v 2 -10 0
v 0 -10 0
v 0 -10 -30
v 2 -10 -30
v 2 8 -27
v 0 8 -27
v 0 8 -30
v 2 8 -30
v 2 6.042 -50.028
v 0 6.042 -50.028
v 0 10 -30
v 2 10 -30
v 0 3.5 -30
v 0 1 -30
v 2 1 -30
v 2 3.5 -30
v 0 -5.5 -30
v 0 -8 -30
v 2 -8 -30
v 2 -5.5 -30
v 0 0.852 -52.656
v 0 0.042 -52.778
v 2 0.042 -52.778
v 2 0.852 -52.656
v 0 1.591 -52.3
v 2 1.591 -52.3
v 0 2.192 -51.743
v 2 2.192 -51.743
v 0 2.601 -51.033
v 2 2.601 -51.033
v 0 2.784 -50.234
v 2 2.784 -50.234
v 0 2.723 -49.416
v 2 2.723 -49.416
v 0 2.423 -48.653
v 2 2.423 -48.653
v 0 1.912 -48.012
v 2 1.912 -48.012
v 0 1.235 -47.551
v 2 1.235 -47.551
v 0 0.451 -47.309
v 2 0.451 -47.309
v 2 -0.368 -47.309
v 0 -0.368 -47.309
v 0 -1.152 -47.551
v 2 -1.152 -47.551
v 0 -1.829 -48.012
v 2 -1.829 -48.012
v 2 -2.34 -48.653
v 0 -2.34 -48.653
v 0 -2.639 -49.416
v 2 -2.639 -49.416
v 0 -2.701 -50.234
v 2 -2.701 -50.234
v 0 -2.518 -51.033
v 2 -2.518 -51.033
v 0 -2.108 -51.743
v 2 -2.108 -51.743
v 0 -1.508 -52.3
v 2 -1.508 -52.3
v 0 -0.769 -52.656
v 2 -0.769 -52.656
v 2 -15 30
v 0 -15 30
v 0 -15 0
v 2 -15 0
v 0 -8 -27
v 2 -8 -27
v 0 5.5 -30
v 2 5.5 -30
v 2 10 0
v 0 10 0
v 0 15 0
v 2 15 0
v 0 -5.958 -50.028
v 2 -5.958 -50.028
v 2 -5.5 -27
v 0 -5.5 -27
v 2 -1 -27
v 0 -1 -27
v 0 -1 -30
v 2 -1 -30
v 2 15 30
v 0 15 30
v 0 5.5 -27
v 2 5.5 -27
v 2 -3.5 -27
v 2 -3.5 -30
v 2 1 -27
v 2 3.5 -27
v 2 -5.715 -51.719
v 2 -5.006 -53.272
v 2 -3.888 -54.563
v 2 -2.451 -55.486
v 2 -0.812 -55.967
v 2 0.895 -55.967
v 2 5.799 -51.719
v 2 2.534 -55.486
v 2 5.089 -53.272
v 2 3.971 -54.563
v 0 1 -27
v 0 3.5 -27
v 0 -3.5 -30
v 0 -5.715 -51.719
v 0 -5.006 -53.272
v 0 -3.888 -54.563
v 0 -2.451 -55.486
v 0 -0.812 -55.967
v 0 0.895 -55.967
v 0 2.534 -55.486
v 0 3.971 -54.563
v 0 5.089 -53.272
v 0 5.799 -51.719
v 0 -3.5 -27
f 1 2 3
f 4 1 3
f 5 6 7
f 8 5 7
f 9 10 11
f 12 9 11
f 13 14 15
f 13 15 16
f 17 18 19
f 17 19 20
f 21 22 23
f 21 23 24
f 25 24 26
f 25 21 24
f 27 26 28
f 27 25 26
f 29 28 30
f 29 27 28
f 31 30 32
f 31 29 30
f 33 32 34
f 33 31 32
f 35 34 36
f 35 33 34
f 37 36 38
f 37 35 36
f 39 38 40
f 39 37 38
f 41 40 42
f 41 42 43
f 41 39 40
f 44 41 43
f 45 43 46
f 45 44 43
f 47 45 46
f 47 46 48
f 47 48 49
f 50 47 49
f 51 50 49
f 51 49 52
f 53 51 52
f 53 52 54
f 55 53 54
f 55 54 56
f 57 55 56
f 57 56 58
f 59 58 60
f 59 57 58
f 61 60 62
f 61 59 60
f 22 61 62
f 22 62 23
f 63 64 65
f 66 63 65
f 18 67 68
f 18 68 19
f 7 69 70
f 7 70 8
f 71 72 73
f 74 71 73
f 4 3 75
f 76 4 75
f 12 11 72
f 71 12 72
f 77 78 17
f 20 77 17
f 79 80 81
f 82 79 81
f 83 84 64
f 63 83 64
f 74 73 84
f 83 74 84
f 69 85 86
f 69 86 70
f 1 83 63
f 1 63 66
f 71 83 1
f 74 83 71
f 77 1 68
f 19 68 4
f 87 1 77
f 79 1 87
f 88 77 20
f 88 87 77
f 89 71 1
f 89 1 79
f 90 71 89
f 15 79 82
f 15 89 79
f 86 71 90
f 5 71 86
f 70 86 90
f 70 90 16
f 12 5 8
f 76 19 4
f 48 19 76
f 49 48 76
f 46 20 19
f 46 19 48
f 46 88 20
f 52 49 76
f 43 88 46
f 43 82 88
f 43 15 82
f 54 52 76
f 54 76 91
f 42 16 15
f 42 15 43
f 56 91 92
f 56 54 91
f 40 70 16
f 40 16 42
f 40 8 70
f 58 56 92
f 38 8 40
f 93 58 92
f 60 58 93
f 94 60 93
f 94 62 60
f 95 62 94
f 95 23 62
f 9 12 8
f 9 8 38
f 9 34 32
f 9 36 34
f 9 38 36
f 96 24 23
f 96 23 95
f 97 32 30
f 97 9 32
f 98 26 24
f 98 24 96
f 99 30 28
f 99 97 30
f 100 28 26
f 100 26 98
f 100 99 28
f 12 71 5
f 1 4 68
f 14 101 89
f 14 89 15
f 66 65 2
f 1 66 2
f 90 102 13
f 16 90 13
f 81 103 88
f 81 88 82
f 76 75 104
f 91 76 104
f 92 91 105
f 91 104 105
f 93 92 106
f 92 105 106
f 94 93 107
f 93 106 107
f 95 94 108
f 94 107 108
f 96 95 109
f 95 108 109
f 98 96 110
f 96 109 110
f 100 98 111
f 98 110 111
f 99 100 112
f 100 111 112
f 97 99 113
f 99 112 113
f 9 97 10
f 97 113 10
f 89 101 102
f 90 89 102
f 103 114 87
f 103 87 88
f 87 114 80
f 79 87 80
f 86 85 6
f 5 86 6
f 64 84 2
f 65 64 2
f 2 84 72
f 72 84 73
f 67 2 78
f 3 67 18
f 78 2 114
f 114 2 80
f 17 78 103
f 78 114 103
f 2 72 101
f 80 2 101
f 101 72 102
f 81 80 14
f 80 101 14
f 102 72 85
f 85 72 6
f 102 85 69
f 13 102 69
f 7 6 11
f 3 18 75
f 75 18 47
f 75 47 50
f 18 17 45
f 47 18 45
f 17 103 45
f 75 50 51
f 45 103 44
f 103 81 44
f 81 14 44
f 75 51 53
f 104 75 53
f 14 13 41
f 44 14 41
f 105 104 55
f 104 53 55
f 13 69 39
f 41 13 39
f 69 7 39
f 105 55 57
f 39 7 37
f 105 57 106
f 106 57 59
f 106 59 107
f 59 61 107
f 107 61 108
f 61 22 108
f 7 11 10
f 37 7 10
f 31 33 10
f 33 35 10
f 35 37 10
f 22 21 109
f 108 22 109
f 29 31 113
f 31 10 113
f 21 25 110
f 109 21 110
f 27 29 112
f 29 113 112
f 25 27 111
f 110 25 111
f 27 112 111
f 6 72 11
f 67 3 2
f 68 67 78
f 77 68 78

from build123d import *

# Parameters (mm, degrees)
SKETCH1_R           = 2.75
SKETCH1_W           = 3
SKETCH1_H           = 2.5
BOSS_EXTRUDE1_DEPTH = 2


with BuildPart() as part:
    # Sketch1 → Boss-Extrude1 (new body)
    with BuildSketch(Plane(origin=(0, 0, 0), x_dir=(0, 0, -1), z_dir=(1, 0, 0))):
        with BuildLine():
            Line((30, 10), (0, 10))
            Line((0, 10), (0, 15))
            Line((0, 15), (-30, 15))
            Line((-30, 15), (-30, -15))
            Line((-30, -15), (0, -15))
            Line((0, -15), (0, -10))
            Line((0, -10), (30, -10))
            Line((30, -10), (50.02830583, -5.958427618))
            ThreePointArc((50.02830583, -5.958427618), (56.02830583, 0.041572382), (50.02830583, 6.041572382))
            Line((50.02830583, 6.041572382), (30, 10))
        make_face()
        with Locations((50.02830583, 0.041572382)):
            Circle(SKETCH1_R, mode=Mode.SUBTRACT)
        with Locations((28.5, -6.75)):
            Rectangle(SKETCH1_W, SKETCH1_H, mode=Mode.SUBTRACT)
        with Locations((28.5, -2.25)):
            Rectangle(SKETCH1_W, SKETCH1_H, mode=Mode.SUBTRACT)
        with Locations((28.5, 2.25)):
            Rectangle(SKETCH1_W, SKETCH1_H, mode=Mode.SUBTRACT)
        with Locations((28.5, 6.75)):
            Rectangle(SKETCH1_W, SKETCH1_H, mode=Mode.SUBTRACT)
    extrude(amount=BOSS_EXTRUDE1_DEPTH)


solid = part.part
